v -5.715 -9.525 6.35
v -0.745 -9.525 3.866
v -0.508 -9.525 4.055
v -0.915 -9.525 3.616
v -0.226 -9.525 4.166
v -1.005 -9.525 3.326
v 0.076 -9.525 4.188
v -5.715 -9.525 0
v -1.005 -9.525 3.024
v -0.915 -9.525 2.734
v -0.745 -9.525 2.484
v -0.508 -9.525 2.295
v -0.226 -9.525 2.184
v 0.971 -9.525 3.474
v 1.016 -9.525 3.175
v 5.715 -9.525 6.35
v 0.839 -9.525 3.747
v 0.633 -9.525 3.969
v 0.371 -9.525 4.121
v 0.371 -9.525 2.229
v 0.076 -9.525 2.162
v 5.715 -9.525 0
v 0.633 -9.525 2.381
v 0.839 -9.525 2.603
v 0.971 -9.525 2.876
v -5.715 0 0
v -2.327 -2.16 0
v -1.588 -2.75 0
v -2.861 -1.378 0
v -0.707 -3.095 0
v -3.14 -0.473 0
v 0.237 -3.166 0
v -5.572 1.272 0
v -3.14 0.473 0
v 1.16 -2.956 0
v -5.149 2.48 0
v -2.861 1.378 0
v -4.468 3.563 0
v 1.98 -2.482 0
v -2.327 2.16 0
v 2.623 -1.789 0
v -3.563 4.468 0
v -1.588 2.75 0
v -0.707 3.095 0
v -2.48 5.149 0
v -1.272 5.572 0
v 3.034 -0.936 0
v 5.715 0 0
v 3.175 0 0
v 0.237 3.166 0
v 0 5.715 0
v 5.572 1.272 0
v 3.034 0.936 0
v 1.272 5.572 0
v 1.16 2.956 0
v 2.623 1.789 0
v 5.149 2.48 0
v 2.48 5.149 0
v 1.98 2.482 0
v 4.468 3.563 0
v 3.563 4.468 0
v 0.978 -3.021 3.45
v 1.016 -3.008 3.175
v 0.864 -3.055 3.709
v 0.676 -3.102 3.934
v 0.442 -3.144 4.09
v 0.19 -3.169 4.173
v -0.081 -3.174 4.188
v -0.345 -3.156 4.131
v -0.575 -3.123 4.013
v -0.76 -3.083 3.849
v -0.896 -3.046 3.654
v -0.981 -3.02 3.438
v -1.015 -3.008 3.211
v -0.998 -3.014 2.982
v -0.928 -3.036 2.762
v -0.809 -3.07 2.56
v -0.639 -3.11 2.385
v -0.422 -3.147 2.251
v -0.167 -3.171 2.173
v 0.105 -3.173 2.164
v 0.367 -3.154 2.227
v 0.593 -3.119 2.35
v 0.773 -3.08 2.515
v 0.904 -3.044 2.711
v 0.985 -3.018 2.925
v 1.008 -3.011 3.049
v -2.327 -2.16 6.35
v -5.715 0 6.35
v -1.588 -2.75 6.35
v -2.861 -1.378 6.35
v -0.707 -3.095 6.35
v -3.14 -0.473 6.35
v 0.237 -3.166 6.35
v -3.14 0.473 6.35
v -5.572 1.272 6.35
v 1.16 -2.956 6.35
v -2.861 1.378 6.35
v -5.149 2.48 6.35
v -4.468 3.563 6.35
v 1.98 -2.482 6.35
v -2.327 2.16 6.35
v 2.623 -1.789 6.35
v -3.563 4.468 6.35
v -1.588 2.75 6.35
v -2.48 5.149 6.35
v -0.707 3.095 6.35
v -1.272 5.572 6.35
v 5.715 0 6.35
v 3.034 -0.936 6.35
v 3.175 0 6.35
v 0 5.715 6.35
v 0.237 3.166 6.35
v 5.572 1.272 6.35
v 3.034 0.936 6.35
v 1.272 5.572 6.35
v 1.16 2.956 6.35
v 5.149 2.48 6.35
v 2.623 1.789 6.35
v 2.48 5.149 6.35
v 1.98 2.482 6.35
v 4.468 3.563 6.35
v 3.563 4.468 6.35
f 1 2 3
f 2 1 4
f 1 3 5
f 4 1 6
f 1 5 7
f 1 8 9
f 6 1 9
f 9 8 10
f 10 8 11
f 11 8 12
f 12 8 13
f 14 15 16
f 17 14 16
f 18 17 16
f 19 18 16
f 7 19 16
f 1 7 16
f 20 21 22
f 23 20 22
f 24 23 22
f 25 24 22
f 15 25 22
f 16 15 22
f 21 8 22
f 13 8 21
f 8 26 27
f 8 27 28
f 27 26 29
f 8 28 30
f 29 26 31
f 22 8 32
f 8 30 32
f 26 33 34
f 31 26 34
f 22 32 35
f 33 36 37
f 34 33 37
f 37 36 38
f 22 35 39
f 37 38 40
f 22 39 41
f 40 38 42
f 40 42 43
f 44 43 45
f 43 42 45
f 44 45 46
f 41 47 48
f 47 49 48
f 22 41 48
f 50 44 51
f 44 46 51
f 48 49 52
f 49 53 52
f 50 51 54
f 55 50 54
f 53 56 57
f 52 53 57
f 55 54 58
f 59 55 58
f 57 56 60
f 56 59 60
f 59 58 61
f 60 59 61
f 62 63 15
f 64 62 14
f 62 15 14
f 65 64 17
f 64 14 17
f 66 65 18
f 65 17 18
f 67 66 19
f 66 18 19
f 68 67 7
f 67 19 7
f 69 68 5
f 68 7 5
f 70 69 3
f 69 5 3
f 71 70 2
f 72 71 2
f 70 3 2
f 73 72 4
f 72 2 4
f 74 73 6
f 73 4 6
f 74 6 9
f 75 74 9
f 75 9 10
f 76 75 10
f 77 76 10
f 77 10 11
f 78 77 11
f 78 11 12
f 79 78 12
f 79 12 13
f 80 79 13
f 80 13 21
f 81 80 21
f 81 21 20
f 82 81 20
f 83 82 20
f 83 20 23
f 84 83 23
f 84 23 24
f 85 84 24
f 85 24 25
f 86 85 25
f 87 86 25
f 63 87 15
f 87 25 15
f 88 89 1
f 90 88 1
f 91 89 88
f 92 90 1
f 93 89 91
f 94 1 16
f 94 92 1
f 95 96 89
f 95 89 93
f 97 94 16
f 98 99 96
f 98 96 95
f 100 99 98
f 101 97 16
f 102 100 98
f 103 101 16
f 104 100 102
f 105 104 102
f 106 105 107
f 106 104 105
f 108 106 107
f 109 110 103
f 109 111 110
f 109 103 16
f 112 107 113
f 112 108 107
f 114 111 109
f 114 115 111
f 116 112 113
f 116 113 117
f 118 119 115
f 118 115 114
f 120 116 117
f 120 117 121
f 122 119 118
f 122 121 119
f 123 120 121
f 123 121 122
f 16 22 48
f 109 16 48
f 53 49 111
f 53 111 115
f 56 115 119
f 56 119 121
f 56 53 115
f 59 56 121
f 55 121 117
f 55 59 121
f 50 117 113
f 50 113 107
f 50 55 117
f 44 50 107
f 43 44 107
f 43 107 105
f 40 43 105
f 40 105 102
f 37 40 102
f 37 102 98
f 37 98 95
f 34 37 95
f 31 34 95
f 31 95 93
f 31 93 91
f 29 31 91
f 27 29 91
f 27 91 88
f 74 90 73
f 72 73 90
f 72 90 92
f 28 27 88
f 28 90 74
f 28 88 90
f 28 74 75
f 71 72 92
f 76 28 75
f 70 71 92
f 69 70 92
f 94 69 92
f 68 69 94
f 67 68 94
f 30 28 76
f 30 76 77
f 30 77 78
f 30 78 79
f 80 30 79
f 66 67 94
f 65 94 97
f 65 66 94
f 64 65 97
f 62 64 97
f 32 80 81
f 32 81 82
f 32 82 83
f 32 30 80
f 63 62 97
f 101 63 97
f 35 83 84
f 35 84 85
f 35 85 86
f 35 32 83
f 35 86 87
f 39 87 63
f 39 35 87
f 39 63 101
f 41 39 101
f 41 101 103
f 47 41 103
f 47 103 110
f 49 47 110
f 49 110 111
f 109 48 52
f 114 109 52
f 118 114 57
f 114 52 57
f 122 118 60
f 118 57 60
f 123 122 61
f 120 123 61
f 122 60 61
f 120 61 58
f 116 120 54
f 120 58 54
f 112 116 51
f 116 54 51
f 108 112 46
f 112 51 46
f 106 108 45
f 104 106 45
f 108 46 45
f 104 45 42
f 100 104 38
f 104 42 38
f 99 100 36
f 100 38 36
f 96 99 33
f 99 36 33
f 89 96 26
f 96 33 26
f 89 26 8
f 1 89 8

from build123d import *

# Parameters (mm, degrees)
SKETCH1_R           = 3.175
BOSS_EXTRUDE1_DEPTH = 6.35
SKETCH2_R           = 1.016
CUT_EXTRUDE1_DEPTH  = 9.144


with BuildPart() as part:
    # Sketch1 → Boss-Extrude1 (new body)
    with BuildSketch(Plane.XY):
        with BuildLine():
            Line((-5.715, -9.525), (5.715, -9.525))
            Line((5.715, -9.525), (5.715, 0))
            ThreePointArc((5.715, 0), (0, 5.715), (-5.715, 0))
            Line((-5.715, 0), (-5.715, -9.525))
        make_face()
        Circle(SKETCH1_R, mode=Mode.SUBTRACT)
    extrude(amount=BOSS_EXTRUDE1_DEPTH)

    # Sketch2 → Cut-Extrude1 (cut)
    with BuildSketch(Plane.XZ.offset(9.525)):
        with Locations((0, 3.175)):
            Circle(SKETCH2_R)
    extrude(amount=-CUT_EXTRUDE1_DEPTH, mode=Mode.SUBTRACT)


solid = part.part
